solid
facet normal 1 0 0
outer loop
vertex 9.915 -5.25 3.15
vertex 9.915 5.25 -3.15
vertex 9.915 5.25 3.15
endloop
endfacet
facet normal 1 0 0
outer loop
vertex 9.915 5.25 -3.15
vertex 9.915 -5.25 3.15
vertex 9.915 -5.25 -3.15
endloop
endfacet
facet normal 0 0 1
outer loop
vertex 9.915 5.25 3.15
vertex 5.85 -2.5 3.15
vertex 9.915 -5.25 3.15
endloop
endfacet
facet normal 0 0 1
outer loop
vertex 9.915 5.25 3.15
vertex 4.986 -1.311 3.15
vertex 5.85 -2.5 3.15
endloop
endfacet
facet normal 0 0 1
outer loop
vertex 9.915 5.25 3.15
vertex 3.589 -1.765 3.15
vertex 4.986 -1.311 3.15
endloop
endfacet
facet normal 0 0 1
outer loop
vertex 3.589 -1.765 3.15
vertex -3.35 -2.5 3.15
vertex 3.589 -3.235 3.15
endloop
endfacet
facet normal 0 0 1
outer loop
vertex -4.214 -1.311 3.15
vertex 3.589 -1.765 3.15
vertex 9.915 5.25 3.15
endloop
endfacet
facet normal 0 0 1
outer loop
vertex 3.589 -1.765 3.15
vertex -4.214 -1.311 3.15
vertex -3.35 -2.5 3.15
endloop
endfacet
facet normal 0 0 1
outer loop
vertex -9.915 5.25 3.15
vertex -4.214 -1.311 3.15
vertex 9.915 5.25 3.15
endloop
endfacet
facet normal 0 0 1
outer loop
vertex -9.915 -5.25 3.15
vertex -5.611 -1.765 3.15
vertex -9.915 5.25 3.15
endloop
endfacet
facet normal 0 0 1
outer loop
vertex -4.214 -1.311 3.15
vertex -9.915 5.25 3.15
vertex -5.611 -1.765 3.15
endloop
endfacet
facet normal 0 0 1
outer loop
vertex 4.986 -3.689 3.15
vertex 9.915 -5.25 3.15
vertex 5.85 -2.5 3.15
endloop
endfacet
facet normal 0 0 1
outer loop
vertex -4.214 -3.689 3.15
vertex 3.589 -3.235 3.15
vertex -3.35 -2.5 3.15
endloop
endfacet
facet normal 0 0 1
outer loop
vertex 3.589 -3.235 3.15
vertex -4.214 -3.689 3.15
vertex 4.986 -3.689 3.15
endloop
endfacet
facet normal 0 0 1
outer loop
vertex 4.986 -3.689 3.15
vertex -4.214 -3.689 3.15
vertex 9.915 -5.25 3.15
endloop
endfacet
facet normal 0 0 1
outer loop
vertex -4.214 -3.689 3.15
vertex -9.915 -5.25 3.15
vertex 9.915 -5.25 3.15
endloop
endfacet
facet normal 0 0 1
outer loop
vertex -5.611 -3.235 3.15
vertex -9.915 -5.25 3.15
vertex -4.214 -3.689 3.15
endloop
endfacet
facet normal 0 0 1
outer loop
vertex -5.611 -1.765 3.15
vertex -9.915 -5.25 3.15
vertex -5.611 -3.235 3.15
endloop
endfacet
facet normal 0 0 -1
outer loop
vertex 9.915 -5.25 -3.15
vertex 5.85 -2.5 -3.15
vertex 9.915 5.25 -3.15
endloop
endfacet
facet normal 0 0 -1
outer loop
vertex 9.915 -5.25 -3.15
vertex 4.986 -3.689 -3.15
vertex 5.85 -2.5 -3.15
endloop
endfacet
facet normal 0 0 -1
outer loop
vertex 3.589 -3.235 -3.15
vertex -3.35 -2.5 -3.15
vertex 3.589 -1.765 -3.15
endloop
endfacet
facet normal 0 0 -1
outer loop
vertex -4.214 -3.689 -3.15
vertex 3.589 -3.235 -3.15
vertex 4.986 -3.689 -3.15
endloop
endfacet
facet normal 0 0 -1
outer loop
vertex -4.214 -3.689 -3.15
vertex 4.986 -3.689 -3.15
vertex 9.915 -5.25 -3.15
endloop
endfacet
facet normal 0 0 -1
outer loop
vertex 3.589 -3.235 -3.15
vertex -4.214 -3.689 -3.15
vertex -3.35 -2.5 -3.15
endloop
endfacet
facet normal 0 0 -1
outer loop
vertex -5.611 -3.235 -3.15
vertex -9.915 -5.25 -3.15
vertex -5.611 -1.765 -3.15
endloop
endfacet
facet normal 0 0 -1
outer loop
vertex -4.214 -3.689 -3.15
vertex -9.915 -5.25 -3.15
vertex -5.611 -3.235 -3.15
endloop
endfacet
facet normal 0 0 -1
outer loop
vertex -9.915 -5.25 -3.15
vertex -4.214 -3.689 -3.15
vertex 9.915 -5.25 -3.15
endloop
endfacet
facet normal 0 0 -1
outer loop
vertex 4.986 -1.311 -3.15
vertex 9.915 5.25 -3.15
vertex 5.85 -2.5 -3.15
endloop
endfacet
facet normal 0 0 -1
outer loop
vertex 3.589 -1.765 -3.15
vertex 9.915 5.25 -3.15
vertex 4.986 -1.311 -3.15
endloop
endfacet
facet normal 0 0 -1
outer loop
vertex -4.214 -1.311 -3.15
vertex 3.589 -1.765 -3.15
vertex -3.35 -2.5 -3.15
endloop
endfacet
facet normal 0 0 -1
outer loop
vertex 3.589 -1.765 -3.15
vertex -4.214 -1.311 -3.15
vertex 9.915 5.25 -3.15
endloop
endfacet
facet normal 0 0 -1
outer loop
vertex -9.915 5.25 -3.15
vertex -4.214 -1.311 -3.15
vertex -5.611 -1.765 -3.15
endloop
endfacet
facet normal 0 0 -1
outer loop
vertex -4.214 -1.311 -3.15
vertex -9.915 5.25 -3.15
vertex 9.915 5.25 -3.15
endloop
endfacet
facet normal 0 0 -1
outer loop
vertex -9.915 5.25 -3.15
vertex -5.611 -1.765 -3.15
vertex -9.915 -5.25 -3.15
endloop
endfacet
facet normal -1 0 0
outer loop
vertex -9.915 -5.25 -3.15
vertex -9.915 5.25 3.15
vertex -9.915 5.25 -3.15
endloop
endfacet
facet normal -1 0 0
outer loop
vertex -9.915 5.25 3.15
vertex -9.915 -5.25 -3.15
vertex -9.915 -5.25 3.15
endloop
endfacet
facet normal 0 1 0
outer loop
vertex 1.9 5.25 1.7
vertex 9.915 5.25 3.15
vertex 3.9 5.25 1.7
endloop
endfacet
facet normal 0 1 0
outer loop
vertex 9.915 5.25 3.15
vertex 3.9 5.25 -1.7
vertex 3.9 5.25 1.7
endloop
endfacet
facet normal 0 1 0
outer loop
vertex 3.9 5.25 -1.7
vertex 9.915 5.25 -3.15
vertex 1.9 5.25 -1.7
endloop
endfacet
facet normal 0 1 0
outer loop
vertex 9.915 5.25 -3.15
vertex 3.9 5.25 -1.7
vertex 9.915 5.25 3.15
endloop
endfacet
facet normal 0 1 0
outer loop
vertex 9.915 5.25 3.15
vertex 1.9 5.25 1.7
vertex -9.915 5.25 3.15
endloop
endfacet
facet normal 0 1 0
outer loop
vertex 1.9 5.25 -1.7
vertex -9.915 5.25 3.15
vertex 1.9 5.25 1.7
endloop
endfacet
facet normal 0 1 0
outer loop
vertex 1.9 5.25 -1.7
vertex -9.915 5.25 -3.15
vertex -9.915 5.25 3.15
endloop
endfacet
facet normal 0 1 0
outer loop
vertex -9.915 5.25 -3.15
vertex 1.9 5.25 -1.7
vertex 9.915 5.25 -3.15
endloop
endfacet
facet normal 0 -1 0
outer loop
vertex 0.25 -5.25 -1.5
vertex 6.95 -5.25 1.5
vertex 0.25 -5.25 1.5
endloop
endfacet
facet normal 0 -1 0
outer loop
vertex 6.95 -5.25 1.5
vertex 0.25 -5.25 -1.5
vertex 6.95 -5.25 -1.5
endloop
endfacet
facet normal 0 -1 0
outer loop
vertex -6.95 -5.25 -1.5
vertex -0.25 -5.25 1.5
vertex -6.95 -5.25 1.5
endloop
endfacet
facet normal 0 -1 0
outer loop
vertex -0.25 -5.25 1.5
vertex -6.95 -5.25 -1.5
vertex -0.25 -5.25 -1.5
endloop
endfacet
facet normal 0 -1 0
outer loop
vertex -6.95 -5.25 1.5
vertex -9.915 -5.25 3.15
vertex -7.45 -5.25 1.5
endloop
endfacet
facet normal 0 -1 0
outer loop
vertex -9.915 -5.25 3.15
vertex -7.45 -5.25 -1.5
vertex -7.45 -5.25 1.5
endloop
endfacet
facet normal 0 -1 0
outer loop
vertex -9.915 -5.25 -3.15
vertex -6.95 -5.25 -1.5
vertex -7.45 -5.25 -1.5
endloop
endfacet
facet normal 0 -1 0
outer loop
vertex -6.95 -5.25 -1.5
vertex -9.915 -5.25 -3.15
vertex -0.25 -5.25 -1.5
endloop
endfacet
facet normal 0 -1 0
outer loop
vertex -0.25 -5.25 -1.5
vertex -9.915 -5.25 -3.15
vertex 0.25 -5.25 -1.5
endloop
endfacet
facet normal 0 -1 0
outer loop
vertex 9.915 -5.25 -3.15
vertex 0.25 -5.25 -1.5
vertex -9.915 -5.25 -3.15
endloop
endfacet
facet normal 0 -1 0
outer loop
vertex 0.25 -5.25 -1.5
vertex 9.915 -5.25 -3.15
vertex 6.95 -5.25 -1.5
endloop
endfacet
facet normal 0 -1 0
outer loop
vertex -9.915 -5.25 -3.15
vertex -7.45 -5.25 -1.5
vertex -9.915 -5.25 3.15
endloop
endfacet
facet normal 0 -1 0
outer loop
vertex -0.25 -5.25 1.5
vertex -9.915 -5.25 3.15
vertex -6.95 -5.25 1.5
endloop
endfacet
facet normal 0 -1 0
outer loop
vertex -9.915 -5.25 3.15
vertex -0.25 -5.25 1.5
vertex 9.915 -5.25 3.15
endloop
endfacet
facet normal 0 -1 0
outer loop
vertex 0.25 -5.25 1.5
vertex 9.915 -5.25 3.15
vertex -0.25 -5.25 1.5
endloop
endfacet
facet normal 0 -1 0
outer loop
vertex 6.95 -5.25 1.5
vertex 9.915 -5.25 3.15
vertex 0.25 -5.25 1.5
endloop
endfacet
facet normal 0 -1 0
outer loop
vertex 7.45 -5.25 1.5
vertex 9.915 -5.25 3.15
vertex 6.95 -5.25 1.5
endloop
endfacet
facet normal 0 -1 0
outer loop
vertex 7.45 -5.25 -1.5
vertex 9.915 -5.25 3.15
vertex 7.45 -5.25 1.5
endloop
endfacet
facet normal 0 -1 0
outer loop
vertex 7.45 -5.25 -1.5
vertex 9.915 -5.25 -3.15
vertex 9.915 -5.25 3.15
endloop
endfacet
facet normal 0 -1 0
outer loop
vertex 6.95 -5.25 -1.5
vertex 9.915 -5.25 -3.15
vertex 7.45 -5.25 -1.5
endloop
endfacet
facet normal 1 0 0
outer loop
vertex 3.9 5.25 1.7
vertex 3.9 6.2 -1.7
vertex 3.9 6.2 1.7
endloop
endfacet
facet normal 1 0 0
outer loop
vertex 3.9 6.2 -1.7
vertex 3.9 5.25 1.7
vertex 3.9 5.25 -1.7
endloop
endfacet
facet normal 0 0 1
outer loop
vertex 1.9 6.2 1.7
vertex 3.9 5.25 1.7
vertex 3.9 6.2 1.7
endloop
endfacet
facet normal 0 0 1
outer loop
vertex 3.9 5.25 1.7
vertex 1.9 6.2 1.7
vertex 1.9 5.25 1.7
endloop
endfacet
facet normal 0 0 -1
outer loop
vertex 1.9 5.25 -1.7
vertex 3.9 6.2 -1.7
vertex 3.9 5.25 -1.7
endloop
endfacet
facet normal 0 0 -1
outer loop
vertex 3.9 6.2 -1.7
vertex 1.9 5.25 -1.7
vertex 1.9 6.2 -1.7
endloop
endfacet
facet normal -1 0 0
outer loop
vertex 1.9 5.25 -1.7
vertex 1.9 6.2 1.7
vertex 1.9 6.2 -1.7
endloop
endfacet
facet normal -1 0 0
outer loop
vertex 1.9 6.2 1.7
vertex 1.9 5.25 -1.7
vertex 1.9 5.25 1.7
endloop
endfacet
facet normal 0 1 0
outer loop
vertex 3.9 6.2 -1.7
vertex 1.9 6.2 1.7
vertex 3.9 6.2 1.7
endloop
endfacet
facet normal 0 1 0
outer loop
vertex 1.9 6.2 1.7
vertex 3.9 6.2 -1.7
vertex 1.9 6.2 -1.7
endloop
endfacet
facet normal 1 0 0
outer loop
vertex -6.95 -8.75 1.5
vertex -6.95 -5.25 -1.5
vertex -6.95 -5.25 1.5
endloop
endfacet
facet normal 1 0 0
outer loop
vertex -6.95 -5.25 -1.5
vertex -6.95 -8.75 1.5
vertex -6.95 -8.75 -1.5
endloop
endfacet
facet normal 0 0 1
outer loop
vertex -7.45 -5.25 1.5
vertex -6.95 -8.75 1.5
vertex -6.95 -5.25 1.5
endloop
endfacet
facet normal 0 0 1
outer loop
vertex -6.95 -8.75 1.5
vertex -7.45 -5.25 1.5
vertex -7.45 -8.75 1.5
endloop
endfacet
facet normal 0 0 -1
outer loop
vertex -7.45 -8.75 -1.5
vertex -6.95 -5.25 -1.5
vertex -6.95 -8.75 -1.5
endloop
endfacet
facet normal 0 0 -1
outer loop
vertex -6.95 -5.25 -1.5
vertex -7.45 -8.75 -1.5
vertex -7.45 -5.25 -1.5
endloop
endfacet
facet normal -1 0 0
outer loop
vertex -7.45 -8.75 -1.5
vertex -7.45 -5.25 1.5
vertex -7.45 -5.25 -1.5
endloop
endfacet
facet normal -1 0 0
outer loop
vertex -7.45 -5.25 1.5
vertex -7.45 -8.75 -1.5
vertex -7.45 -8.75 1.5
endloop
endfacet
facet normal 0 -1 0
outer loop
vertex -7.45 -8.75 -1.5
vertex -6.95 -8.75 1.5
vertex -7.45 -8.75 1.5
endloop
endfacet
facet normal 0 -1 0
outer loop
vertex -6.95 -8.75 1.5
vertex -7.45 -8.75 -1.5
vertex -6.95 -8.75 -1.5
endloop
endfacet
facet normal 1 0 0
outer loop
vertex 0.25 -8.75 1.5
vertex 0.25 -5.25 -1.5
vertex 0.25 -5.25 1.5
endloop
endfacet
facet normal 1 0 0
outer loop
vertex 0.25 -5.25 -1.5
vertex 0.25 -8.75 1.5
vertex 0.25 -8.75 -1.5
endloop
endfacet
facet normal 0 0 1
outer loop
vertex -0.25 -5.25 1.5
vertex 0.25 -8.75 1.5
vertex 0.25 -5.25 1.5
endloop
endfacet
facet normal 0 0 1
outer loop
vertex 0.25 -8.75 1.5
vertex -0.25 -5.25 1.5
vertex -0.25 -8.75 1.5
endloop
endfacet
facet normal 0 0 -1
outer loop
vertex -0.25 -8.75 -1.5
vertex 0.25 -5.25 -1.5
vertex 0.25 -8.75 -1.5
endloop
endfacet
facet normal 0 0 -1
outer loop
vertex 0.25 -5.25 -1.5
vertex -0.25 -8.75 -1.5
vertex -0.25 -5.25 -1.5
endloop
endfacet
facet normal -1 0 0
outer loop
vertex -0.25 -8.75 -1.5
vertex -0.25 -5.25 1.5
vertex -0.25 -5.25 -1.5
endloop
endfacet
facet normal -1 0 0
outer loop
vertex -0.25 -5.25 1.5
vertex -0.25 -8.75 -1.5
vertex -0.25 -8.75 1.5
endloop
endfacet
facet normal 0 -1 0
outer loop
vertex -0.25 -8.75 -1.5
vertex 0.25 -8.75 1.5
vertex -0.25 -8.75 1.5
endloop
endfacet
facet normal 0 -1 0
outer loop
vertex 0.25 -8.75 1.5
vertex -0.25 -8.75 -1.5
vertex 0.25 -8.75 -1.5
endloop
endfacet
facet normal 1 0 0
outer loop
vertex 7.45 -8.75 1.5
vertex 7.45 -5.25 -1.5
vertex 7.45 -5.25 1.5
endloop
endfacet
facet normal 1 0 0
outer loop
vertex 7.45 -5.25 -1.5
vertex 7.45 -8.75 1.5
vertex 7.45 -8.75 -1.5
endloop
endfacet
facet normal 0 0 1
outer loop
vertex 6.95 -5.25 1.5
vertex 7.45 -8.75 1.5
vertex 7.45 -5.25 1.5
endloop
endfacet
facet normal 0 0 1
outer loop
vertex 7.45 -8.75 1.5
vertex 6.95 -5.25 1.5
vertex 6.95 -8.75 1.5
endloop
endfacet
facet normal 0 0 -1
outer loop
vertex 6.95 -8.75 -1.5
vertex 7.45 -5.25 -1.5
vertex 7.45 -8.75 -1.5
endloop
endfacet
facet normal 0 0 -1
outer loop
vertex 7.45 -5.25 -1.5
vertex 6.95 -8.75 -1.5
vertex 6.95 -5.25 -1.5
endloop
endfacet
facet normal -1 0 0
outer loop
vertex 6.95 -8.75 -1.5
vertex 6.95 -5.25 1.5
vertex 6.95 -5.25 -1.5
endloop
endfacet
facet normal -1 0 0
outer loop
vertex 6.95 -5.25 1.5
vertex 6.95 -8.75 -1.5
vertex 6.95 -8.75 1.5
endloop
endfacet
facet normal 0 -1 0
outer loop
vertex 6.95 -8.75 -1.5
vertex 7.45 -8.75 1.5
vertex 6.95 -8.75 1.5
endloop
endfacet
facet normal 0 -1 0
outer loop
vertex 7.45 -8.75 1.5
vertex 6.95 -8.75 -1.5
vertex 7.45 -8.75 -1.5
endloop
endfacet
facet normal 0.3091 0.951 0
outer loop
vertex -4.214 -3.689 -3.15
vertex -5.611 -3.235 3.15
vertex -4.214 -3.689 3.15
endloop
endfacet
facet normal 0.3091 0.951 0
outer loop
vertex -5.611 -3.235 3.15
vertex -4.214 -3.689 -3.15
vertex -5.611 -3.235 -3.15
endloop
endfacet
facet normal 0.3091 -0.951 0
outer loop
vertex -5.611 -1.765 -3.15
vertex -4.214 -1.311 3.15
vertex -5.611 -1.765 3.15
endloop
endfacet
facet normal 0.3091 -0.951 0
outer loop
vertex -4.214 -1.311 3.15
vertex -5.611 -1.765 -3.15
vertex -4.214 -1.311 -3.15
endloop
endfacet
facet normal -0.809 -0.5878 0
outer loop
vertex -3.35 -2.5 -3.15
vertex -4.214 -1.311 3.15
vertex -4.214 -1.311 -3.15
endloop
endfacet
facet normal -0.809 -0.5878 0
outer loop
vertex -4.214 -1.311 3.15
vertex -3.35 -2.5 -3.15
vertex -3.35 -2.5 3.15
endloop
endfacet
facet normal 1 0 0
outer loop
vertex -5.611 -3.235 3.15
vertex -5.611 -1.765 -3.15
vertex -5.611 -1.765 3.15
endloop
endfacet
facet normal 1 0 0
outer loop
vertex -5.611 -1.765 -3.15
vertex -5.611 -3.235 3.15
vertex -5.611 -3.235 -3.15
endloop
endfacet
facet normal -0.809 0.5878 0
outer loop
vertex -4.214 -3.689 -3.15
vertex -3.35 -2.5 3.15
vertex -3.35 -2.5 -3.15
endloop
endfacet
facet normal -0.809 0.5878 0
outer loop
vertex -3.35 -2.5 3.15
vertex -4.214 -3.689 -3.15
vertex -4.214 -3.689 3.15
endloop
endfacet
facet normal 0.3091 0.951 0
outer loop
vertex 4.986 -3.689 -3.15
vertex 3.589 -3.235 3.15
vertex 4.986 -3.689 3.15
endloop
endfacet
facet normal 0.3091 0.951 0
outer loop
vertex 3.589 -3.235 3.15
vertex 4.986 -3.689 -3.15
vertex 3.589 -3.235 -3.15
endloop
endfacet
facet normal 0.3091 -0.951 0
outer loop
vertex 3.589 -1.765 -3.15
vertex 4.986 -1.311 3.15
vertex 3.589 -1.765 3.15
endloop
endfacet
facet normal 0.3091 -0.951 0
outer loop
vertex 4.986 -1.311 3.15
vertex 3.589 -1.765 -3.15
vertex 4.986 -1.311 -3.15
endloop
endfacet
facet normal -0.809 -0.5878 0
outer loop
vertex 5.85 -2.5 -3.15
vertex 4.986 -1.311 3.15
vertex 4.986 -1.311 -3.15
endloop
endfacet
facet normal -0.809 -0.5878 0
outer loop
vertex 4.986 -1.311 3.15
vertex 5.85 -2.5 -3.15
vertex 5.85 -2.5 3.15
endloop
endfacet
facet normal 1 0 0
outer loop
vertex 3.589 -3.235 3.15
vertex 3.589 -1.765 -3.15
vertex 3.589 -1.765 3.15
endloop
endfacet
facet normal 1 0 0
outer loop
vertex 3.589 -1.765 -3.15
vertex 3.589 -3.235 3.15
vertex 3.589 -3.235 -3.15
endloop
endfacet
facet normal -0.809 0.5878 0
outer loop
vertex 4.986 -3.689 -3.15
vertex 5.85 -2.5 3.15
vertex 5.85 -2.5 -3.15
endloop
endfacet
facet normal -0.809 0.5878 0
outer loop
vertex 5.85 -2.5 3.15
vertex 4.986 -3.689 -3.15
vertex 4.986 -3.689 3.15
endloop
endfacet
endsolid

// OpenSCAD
/*
 * Written by Dermot Tynan, Kalopa Research.
 * GPLv2.
 *
 * All dimensions are in mm.
 */
module microswitch()
{
	difference() {
		union() {
			cube([19.83, 10.5, 6.3], center = true);
			translate([2.9, 5.7, 0]) cube([2, 1, 3.4], center = true);
			translate([-7.2, -7, 0]) cube([0.5, 3.5, 3], center = true);
			translate([0, -7, 0]) cube([0.5, 3.5, 3], center = true);
			translate([7.2, -7, 0]) cube([0.5, 3.5, 3], center = true);
		}
		translate([-4.6, -2.5, 0]) cylinder(r = 2.5/2, h = 12, center = true);
		translate([4.6, -2.5, 0]) cylinder(r = 2.5/2, h = 12, center = true);
	}
}

module microswitch_mount()
{
	difference() {
		cube([22, 10.5, 5], center = true);
		translate([-4.6, -2.5, 0]) cylinder(r = 1.5/2, h = 12, center = true);
		translate([4.6, -2.5, 0]) cylinder(r = 1.5/2, h = 12, center = true);
	}
}

microswitch();
